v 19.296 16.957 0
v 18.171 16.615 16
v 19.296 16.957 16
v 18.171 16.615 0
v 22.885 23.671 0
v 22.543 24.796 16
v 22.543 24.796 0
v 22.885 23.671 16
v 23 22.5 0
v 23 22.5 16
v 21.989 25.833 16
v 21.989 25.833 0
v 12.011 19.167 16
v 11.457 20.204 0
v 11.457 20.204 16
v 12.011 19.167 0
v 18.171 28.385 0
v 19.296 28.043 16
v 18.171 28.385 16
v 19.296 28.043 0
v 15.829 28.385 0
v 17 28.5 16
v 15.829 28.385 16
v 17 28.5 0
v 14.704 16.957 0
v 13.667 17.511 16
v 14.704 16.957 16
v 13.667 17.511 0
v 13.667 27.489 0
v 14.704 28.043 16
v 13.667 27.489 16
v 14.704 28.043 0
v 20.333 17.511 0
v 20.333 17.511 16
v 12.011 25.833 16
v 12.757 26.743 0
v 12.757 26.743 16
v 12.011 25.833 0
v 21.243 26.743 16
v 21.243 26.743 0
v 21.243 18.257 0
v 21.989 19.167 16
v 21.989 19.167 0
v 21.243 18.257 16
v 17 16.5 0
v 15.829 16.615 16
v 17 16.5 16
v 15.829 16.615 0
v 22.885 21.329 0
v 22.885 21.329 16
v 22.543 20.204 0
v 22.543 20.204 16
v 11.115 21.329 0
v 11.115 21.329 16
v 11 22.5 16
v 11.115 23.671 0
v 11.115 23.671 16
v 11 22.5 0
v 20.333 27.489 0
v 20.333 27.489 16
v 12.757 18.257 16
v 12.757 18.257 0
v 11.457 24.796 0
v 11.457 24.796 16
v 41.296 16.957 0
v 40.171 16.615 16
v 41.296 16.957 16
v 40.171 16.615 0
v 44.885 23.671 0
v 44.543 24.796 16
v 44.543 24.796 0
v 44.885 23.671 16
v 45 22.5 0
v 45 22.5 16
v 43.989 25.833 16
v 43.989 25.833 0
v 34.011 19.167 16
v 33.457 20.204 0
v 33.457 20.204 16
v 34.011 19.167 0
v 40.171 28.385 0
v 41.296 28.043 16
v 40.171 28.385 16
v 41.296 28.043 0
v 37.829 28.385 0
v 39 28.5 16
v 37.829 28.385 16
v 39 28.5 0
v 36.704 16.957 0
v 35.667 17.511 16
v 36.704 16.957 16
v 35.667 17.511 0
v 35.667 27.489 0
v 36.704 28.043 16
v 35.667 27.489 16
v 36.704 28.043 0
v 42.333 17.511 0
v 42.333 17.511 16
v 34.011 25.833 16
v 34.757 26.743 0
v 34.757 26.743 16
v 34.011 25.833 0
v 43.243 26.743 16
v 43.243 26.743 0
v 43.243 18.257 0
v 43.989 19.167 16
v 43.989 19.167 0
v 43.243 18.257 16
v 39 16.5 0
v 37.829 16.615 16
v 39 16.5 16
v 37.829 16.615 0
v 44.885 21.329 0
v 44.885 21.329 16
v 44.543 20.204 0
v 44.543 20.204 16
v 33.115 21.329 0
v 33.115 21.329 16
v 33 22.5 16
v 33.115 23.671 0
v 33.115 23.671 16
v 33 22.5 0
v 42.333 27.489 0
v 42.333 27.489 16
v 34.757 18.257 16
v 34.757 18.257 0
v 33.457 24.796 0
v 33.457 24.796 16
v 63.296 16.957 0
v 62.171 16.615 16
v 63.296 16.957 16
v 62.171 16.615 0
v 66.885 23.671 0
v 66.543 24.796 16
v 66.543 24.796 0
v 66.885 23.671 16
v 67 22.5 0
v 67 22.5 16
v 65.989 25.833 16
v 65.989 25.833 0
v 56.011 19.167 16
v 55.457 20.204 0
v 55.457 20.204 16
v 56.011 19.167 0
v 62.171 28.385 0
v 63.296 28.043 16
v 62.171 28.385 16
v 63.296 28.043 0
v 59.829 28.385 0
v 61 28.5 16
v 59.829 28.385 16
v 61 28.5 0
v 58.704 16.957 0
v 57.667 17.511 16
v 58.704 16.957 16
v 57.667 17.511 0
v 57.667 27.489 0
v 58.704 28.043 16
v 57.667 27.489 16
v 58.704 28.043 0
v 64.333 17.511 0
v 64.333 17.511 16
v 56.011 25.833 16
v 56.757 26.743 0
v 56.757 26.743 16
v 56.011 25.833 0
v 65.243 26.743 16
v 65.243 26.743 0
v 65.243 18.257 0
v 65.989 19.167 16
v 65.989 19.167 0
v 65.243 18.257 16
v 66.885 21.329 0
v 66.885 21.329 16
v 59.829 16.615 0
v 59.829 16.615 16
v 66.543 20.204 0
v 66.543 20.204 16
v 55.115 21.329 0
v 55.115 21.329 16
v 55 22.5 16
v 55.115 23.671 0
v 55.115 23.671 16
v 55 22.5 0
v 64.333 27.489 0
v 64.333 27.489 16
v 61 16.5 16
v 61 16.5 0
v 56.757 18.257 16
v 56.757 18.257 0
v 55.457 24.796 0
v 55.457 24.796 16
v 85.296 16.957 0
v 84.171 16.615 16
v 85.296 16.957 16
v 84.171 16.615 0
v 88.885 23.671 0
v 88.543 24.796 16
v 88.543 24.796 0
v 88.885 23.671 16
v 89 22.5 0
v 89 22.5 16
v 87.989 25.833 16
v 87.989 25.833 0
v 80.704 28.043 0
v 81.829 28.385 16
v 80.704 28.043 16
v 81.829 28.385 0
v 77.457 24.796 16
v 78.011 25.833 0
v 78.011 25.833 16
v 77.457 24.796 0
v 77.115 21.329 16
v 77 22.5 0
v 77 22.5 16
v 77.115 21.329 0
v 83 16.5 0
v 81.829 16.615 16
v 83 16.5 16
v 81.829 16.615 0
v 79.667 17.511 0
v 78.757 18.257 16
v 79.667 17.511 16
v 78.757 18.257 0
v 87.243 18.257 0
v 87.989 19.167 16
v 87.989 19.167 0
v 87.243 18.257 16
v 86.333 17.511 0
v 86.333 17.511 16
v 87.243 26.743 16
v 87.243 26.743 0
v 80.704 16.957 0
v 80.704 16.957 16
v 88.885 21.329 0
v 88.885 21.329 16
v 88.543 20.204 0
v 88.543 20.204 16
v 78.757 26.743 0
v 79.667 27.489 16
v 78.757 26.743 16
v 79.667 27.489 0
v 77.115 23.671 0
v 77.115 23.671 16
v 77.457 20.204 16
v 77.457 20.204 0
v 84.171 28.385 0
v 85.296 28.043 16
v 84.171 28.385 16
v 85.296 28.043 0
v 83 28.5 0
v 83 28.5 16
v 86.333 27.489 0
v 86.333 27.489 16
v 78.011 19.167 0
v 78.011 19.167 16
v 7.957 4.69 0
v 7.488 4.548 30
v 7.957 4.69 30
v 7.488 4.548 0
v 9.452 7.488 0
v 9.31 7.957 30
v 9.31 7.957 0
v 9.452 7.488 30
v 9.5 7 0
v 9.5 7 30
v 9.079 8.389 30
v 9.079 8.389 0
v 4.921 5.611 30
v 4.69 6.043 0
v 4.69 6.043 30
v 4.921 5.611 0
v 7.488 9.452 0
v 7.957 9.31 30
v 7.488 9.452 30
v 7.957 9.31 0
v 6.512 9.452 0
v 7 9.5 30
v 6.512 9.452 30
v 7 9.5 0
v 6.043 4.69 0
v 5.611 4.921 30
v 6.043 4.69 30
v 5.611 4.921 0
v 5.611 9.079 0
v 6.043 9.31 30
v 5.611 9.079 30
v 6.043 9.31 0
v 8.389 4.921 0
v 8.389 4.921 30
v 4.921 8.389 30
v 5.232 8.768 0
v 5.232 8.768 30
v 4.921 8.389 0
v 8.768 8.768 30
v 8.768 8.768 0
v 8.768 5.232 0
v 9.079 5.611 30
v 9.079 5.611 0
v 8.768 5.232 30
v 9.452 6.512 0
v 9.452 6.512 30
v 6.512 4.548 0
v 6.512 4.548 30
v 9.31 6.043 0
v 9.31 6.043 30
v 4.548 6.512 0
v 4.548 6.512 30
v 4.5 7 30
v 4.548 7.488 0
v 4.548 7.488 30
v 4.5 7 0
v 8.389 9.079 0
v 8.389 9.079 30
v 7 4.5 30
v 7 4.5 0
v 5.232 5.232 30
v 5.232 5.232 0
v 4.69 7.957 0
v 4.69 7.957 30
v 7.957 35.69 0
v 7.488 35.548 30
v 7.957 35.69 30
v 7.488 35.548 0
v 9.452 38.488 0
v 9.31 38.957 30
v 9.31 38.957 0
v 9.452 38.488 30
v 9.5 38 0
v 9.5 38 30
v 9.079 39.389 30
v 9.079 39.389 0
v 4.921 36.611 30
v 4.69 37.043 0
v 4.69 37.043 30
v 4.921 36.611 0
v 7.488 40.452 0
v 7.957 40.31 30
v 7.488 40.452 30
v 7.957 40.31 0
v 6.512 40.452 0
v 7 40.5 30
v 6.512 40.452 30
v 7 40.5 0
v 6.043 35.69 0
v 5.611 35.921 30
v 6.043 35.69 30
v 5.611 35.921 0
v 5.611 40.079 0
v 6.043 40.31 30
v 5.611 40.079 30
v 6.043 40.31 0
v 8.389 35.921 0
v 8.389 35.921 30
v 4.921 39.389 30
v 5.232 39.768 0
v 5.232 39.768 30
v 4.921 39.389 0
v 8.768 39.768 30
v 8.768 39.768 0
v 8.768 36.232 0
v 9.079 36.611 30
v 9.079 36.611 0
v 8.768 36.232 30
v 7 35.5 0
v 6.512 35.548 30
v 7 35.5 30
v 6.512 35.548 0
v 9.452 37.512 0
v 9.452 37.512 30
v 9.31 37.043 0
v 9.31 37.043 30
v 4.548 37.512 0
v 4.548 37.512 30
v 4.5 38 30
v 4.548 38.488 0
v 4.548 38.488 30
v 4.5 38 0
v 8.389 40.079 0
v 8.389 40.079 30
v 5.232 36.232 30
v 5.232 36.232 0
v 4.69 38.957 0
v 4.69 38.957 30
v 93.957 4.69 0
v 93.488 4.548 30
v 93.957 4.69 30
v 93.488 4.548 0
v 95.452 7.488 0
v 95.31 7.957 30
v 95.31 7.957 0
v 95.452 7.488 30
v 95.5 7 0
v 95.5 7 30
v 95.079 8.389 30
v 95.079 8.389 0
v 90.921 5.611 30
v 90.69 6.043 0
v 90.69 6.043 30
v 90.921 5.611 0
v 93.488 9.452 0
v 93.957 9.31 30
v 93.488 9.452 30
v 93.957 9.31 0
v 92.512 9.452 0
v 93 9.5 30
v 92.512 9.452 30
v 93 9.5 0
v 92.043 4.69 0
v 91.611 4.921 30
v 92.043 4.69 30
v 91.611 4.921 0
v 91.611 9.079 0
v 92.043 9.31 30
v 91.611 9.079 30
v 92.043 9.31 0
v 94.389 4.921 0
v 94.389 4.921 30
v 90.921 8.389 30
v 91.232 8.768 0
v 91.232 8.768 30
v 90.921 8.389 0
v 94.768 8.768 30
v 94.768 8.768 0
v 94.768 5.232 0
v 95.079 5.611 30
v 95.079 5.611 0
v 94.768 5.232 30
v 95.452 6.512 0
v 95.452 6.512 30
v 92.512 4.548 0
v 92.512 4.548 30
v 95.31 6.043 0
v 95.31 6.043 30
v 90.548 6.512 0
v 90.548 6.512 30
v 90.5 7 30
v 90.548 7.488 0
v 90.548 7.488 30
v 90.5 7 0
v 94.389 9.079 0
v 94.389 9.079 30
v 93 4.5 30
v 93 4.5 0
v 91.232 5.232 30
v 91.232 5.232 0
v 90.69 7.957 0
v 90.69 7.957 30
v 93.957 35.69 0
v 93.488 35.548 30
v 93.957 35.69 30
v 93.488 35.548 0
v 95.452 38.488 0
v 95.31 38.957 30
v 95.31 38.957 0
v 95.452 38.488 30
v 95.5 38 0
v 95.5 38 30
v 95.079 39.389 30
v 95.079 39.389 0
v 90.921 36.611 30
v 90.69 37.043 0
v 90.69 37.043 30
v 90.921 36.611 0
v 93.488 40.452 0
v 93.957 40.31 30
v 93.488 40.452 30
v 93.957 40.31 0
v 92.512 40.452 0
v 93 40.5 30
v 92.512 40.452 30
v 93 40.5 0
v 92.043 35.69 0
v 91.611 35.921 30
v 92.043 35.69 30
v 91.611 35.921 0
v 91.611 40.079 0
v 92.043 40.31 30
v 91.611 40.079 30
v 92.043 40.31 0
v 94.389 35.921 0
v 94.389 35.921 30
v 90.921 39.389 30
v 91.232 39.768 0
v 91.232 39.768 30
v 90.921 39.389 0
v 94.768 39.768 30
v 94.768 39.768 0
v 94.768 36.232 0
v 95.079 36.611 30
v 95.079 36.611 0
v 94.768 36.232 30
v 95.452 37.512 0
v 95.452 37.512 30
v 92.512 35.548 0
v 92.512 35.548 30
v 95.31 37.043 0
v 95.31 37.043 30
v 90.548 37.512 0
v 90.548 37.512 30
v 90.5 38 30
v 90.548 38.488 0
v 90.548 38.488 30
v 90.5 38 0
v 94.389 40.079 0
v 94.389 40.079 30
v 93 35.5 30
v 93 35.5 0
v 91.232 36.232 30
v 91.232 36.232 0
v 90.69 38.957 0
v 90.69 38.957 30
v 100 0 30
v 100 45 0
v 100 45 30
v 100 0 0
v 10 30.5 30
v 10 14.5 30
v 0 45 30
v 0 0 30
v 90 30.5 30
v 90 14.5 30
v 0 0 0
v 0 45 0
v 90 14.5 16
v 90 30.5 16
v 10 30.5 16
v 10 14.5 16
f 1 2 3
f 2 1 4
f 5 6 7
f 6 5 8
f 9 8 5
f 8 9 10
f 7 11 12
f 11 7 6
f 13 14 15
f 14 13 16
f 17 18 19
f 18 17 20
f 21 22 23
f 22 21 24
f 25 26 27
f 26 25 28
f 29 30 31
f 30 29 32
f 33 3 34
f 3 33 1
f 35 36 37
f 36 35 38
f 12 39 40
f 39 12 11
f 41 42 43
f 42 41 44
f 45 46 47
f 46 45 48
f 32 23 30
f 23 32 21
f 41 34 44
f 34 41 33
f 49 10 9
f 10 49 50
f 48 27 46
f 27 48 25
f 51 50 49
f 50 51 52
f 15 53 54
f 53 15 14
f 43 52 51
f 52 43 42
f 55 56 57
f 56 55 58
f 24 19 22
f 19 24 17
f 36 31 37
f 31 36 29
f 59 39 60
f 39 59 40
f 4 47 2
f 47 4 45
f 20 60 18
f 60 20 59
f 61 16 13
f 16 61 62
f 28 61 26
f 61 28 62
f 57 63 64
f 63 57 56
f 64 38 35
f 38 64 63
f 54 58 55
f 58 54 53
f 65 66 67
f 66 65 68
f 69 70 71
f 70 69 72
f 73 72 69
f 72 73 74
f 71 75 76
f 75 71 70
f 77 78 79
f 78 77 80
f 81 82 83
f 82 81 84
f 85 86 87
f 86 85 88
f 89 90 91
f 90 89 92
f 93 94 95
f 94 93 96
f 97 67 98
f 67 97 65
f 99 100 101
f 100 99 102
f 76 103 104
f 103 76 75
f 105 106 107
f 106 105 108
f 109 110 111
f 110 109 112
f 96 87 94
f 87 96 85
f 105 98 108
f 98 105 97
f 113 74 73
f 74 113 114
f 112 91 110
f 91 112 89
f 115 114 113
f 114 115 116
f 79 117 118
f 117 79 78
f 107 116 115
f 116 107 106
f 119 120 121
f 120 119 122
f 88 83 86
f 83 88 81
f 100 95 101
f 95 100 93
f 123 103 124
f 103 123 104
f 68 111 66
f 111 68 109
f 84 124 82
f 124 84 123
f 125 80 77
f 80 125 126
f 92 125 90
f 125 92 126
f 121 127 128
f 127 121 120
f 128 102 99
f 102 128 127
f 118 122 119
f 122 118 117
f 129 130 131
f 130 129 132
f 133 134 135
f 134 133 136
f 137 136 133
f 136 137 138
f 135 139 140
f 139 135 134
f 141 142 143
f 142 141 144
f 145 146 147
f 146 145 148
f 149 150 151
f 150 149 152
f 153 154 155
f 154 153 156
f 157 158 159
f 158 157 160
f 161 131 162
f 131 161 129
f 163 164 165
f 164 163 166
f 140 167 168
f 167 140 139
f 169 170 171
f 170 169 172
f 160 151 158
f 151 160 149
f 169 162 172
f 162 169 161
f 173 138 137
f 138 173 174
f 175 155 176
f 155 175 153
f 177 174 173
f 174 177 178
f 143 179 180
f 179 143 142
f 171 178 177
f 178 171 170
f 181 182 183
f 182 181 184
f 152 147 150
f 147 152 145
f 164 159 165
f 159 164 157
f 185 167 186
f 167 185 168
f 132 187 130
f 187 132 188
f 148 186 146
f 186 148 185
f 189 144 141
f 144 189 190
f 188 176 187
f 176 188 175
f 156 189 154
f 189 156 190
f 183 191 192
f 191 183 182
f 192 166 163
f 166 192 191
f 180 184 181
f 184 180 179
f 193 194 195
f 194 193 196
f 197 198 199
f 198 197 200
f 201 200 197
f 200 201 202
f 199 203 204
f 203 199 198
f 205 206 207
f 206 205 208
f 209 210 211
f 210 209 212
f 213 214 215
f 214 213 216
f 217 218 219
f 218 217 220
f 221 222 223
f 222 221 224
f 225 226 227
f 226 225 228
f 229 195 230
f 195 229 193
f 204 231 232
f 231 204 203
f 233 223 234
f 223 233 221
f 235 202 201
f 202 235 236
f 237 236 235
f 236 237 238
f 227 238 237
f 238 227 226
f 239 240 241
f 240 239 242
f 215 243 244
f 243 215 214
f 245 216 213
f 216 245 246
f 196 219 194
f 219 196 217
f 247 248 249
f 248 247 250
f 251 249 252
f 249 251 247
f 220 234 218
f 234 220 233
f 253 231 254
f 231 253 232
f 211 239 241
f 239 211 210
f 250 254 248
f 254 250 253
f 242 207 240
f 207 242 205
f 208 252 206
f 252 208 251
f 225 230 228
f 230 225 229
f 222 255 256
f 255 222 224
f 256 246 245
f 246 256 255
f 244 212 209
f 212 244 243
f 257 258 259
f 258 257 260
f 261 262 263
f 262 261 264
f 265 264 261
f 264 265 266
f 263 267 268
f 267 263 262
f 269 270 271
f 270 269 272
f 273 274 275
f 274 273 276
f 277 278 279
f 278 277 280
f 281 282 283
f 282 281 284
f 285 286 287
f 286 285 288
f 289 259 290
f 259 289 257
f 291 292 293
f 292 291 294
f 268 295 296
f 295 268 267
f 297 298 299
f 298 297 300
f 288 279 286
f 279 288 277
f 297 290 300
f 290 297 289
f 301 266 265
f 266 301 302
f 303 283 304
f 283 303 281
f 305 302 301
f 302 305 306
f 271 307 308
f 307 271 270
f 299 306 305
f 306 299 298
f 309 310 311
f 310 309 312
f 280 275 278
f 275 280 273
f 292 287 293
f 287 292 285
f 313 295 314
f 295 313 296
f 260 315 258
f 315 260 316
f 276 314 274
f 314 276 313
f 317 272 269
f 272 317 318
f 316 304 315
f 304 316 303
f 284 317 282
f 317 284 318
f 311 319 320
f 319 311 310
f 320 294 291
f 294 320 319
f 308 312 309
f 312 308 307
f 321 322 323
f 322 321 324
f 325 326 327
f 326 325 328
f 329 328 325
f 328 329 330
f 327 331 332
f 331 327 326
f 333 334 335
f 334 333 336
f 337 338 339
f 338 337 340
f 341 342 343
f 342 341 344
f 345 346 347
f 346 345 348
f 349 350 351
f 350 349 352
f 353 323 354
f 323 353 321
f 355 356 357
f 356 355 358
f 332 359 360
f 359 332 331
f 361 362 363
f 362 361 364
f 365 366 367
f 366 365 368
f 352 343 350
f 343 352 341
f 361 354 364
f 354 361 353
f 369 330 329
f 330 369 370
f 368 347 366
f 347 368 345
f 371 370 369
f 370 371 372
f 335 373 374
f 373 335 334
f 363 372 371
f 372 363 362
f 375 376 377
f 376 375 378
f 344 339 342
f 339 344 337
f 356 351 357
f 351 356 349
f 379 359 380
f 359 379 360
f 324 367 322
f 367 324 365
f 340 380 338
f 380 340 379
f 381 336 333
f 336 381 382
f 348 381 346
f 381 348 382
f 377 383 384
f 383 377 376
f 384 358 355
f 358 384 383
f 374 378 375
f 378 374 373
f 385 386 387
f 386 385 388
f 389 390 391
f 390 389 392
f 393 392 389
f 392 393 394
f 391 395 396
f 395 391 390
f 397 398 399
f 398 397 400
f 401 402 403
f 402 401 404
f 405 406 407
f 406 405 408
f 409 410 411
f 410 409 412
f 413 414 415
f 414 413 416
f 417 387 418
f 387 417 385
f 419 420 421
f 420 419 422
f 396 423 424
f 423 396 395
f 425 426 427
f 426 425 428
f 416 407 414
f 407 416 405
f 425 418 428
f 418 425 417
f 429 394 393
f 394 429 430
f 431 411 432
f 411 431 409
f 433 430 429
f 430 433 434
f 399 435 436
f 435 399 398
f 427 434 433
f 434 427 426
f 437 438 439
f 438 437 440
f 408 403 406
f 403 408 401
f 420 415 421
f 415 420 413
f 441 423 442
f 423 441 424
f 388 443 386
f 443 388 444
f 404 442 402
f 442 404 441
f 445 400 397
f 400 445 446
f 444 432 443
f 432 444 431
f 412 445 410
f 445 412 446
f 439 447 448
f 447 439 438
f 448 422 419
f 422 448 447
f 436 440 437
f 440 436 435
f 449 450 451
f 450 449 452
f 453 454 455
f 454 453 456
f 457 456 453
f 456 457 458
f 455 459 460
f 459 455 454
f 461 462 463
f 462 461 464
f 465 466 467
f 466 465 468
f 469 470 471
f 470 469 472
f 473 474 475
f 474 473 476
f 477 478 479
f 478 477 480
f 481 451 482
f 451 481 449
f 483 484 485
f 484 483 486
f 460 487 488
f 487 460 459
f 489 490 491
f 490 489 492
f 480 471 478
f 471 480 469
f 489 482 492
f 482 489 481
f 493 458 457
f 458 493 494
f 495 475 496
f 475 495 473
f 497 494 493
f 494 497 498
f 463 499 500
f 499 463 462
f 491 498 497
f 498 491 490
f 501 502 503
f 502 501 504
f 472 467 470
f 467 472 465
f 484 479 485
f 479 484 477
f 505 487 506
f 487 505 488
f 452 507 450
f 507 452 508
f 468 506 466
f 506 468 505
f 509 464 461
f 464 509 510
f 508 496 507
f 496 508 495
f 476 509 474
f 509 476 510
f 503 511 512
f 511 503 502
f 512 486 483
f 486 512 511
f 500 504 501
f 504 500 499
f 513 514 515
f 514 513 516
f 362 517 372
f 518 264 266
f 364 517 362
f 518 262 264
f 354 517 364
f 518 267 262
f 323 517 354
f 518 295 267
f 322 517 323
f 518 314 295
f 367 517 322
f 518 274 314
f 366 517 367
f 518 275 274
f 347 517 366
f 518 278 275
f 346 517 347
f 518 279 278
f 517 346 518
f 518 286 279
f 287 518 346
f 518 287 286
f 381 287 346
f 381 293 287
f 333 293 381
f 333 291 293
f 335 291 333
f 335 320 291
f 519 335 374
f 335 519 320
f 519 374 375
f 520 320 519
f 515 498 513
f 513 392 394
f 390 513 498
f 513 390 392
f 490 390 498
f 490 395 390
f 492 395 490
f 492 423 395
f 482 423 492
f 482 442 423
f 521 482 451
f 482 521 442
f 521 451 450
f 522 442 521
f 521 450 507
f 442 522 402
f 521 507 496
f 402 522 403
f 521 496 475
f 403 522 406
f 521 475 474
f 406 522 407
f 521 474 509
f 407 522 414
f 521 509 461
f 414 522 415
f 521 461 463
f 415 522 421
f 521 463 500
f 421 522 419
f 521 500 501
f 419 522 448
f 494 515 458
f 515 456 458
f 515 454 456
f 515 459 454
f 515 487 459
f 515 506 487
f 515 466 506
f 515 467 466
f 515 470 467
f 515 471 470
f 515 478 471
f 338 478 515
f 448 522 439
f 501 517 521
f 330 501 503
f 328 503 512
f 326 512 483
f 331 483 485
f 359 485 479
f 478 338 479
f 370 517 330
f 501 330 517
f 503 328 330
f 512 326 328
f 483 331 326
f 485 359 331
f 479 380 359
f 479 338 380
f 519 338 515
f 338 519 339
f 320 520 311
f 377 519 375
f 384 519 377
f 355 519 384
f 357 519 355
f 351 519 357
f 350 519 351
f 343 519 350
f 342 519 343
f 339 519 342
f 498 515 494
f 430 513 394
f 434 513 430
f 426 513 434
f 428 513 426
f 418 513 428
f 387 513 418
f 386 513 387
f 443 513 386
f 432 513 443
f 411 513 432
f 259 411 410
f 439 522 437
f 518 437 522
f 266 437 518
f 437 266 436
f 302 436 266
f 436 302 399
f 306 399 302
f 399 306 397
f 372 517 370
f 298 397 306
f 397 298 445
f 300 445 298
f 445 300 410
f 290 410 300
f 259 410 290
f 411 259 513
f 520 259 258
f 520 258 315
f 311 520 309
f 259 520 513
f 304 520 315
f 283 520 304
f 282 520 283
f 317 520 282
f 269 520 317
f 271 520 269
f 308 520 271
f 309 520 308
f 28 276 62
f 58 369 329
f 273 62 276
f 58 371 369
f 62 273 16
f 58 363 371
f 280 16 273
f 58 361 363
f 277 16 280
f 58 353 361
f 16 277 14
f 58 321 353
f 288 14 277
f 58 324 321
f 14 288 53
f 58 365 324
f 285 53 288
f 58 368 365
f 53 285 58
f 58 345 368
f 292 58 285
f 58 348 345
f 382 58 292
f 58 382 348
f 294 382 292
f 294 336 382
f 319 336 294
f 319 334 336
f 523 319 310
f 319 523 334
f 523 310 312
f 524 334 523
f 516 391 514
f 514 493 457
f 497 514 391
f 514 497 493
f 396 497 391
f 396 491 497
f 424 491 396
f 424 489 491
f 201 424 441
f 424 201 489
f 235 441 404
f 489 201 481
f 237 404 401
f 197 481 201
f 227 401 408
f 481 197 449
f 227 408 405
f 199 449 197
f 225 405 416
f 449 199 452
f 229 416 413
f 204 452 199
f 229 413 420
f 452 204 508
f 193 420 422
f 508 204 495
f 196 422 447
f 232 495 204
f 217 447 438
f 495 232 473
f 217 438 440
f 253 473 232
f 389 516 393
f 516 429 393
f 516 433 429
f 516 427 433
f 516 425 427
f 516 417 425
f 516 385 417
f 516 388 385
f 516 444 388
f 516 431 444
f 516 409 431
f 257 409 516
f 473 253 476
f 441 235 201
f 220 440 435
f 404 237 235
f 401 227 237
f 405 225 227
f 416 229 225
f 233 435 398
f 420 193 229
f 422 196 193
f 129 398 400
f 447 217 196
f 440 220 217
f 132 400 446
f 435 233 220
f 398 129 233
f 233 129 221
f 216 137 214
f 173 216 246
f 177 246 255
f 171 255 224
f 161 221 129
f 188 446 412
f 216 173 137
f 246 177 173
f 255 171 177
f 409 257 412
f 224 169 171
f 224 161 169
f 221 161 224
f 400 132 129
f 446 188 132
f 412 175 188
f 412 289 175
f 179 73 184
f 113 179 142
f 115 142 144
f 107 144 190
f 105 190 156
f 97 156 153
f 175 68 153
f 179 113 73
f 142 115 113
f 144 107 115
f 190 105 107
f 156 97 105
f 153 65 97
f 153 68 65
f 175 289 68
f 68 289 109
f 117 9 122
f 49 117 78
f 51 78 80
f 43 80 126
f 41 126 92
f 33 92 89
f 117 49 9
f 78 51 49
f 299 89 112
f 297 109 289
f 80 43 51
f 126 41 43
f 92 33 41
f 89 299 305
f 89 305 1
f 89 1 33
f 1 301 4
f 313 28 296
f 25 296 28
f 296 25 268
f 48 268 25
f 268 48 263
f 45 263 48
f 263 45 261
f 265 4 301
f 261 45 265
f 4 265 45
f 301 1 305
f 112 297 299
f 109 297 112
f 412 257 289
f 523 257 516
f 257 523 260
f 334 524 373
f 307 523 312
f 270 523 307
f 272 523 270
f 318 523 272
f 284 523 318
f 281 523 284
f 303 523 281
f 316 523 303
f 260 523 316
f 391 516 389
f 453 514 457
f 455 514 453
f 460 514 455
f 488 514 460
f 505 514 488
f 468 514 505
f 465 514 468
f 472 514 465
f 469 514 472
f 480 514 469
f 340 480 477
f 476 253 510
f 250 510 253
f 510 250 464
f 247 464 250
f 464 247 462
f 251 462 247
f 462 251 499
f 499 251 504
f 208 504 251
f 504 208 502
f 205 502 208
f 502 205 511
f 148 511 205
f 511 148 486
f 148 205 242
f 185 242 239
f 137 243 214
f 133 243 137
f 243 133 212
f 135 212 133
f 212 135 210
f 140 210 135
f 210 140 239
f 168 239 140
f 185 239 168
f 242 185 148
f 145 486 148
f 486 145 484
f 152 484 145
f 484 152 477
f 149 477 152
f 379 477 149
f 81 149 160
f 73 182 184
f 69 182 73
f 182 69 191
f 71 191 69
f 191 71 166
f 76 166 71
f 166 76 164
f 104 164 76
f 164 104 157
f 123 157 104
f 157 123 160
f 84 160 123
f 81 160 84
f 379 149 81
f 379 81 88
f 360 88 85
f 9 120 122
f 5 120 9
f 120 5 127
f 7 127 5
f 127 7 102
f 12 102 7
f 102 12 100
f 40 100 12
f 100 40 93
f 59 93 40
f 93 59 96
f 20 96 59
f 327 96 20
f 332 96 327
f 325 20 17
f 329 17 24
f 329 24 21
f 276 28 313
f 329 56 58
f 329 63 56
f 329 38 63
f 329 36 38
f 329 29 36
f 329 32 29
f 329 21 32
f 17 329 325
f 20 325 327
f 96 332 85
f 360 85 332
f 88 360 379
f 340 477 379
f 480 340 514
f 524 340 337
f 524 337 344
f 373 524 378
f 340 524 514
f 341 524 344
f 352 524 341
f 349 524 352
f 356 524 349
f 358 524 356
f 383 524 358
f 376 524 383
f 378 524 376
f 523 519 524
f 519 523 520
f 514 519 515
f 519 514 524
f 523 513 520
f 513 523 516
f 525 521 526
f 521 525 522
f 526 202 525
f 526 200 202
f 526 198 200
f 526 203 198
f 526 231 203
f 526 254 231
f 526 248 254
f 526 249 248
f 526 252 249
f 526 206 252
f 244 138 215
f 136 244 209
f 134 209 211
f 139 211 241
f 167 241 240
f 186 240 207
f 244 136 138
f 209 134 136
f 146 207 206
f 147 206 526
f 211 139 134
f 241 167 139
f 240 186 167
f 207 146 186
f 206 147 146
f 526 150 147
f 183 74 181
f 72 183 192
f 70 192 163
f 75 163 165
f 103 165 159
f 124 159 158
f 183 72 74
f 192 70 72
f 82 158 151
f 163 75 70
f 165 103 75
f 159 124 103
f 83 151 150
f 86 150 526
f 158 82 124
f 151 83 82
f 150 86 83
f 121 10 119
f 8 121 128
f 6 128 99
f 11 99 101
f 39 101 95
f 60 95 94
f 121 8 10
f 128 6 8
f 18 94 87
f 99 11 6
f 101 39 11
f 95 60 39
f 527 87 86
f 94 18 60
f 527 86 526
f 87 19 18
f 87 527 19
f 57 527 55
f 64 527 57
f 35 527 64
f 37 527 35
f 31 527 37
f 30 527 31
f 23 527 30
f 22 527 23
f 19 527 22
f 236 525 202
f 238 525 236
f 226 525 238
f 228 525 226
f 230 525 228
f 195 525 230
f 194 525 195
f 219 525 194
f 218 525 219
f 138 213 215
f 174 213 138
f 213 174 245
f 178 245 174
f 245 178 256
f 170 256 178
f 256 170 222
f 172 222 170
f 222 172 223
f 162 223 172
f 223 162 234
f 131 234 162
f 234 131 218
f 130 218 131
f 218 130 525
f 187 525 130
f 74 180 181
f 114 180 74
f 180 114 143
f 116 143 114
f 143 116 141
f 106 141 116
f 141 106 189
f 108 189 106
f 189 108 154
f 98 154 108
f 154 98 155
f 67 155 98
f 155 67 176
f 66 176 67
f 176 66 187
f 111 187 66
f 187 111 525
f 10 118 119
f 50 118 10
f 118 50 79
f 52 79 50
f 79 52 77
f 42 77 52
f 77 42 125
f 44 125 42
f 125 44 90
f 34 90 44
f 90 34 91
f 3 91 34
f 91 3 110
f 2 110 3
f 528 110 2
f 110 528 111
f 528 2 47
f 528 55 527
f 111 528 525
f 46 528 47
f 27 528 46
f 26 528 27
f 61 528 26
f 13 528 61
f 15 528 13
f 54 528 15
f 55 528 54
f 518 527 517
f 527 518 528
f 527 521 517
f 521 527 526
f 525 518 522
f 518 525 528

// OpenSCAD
$fn = 32;

// ----------------------------------------------------------------------
// Manifold block: gallery_top manifold
// ----------------------------------------------------------------------

// --- parameters (mm) ---
block_l = 100;            // block length, X
block_w = 45;             // block width, Y
block_h = 30;             // block height, Z
port_d = 12;              // port bore diameter
port_pitch = 22;          // port pitch along X
gallery_d = 16;           // top gallery width, Y
gallery_depth = 14;       // gallery pocket depth
wall_p = 10;              // gallery end wall thickness, X
mnt_d = 5;                // mounting hole diameter
mnt_in = 7;               // mounting hole inset from the edges

n_ports = 4;  // ports in the row
port_x0 = (block_l - (n_ports - 1) * port_pitch) / 2;  // first port X

difference() {
  cube([block_l, block_w, block_h]);
  for (i = [0 : n_ports - 1])
    translate([port_x0 + i * port_pitch, block_w / 2, -1])
      cylinder(h = block_h + 2, d = port_d);
  translate([wall_p, block_w / 2 - gallery_d / 2, block_h - gallery_depth])
    cube([block_l - 2 * wall_p, gallery_d, gallery_depth + 1]);
  for (cx = [mnt_in, block_l - mnt_in])
    for (cy = [mnt_in, block_w - mnt_in])
      translate([cx, cy, -1]) cylinder(h = block_h + 2, d = mnt_d);
}
